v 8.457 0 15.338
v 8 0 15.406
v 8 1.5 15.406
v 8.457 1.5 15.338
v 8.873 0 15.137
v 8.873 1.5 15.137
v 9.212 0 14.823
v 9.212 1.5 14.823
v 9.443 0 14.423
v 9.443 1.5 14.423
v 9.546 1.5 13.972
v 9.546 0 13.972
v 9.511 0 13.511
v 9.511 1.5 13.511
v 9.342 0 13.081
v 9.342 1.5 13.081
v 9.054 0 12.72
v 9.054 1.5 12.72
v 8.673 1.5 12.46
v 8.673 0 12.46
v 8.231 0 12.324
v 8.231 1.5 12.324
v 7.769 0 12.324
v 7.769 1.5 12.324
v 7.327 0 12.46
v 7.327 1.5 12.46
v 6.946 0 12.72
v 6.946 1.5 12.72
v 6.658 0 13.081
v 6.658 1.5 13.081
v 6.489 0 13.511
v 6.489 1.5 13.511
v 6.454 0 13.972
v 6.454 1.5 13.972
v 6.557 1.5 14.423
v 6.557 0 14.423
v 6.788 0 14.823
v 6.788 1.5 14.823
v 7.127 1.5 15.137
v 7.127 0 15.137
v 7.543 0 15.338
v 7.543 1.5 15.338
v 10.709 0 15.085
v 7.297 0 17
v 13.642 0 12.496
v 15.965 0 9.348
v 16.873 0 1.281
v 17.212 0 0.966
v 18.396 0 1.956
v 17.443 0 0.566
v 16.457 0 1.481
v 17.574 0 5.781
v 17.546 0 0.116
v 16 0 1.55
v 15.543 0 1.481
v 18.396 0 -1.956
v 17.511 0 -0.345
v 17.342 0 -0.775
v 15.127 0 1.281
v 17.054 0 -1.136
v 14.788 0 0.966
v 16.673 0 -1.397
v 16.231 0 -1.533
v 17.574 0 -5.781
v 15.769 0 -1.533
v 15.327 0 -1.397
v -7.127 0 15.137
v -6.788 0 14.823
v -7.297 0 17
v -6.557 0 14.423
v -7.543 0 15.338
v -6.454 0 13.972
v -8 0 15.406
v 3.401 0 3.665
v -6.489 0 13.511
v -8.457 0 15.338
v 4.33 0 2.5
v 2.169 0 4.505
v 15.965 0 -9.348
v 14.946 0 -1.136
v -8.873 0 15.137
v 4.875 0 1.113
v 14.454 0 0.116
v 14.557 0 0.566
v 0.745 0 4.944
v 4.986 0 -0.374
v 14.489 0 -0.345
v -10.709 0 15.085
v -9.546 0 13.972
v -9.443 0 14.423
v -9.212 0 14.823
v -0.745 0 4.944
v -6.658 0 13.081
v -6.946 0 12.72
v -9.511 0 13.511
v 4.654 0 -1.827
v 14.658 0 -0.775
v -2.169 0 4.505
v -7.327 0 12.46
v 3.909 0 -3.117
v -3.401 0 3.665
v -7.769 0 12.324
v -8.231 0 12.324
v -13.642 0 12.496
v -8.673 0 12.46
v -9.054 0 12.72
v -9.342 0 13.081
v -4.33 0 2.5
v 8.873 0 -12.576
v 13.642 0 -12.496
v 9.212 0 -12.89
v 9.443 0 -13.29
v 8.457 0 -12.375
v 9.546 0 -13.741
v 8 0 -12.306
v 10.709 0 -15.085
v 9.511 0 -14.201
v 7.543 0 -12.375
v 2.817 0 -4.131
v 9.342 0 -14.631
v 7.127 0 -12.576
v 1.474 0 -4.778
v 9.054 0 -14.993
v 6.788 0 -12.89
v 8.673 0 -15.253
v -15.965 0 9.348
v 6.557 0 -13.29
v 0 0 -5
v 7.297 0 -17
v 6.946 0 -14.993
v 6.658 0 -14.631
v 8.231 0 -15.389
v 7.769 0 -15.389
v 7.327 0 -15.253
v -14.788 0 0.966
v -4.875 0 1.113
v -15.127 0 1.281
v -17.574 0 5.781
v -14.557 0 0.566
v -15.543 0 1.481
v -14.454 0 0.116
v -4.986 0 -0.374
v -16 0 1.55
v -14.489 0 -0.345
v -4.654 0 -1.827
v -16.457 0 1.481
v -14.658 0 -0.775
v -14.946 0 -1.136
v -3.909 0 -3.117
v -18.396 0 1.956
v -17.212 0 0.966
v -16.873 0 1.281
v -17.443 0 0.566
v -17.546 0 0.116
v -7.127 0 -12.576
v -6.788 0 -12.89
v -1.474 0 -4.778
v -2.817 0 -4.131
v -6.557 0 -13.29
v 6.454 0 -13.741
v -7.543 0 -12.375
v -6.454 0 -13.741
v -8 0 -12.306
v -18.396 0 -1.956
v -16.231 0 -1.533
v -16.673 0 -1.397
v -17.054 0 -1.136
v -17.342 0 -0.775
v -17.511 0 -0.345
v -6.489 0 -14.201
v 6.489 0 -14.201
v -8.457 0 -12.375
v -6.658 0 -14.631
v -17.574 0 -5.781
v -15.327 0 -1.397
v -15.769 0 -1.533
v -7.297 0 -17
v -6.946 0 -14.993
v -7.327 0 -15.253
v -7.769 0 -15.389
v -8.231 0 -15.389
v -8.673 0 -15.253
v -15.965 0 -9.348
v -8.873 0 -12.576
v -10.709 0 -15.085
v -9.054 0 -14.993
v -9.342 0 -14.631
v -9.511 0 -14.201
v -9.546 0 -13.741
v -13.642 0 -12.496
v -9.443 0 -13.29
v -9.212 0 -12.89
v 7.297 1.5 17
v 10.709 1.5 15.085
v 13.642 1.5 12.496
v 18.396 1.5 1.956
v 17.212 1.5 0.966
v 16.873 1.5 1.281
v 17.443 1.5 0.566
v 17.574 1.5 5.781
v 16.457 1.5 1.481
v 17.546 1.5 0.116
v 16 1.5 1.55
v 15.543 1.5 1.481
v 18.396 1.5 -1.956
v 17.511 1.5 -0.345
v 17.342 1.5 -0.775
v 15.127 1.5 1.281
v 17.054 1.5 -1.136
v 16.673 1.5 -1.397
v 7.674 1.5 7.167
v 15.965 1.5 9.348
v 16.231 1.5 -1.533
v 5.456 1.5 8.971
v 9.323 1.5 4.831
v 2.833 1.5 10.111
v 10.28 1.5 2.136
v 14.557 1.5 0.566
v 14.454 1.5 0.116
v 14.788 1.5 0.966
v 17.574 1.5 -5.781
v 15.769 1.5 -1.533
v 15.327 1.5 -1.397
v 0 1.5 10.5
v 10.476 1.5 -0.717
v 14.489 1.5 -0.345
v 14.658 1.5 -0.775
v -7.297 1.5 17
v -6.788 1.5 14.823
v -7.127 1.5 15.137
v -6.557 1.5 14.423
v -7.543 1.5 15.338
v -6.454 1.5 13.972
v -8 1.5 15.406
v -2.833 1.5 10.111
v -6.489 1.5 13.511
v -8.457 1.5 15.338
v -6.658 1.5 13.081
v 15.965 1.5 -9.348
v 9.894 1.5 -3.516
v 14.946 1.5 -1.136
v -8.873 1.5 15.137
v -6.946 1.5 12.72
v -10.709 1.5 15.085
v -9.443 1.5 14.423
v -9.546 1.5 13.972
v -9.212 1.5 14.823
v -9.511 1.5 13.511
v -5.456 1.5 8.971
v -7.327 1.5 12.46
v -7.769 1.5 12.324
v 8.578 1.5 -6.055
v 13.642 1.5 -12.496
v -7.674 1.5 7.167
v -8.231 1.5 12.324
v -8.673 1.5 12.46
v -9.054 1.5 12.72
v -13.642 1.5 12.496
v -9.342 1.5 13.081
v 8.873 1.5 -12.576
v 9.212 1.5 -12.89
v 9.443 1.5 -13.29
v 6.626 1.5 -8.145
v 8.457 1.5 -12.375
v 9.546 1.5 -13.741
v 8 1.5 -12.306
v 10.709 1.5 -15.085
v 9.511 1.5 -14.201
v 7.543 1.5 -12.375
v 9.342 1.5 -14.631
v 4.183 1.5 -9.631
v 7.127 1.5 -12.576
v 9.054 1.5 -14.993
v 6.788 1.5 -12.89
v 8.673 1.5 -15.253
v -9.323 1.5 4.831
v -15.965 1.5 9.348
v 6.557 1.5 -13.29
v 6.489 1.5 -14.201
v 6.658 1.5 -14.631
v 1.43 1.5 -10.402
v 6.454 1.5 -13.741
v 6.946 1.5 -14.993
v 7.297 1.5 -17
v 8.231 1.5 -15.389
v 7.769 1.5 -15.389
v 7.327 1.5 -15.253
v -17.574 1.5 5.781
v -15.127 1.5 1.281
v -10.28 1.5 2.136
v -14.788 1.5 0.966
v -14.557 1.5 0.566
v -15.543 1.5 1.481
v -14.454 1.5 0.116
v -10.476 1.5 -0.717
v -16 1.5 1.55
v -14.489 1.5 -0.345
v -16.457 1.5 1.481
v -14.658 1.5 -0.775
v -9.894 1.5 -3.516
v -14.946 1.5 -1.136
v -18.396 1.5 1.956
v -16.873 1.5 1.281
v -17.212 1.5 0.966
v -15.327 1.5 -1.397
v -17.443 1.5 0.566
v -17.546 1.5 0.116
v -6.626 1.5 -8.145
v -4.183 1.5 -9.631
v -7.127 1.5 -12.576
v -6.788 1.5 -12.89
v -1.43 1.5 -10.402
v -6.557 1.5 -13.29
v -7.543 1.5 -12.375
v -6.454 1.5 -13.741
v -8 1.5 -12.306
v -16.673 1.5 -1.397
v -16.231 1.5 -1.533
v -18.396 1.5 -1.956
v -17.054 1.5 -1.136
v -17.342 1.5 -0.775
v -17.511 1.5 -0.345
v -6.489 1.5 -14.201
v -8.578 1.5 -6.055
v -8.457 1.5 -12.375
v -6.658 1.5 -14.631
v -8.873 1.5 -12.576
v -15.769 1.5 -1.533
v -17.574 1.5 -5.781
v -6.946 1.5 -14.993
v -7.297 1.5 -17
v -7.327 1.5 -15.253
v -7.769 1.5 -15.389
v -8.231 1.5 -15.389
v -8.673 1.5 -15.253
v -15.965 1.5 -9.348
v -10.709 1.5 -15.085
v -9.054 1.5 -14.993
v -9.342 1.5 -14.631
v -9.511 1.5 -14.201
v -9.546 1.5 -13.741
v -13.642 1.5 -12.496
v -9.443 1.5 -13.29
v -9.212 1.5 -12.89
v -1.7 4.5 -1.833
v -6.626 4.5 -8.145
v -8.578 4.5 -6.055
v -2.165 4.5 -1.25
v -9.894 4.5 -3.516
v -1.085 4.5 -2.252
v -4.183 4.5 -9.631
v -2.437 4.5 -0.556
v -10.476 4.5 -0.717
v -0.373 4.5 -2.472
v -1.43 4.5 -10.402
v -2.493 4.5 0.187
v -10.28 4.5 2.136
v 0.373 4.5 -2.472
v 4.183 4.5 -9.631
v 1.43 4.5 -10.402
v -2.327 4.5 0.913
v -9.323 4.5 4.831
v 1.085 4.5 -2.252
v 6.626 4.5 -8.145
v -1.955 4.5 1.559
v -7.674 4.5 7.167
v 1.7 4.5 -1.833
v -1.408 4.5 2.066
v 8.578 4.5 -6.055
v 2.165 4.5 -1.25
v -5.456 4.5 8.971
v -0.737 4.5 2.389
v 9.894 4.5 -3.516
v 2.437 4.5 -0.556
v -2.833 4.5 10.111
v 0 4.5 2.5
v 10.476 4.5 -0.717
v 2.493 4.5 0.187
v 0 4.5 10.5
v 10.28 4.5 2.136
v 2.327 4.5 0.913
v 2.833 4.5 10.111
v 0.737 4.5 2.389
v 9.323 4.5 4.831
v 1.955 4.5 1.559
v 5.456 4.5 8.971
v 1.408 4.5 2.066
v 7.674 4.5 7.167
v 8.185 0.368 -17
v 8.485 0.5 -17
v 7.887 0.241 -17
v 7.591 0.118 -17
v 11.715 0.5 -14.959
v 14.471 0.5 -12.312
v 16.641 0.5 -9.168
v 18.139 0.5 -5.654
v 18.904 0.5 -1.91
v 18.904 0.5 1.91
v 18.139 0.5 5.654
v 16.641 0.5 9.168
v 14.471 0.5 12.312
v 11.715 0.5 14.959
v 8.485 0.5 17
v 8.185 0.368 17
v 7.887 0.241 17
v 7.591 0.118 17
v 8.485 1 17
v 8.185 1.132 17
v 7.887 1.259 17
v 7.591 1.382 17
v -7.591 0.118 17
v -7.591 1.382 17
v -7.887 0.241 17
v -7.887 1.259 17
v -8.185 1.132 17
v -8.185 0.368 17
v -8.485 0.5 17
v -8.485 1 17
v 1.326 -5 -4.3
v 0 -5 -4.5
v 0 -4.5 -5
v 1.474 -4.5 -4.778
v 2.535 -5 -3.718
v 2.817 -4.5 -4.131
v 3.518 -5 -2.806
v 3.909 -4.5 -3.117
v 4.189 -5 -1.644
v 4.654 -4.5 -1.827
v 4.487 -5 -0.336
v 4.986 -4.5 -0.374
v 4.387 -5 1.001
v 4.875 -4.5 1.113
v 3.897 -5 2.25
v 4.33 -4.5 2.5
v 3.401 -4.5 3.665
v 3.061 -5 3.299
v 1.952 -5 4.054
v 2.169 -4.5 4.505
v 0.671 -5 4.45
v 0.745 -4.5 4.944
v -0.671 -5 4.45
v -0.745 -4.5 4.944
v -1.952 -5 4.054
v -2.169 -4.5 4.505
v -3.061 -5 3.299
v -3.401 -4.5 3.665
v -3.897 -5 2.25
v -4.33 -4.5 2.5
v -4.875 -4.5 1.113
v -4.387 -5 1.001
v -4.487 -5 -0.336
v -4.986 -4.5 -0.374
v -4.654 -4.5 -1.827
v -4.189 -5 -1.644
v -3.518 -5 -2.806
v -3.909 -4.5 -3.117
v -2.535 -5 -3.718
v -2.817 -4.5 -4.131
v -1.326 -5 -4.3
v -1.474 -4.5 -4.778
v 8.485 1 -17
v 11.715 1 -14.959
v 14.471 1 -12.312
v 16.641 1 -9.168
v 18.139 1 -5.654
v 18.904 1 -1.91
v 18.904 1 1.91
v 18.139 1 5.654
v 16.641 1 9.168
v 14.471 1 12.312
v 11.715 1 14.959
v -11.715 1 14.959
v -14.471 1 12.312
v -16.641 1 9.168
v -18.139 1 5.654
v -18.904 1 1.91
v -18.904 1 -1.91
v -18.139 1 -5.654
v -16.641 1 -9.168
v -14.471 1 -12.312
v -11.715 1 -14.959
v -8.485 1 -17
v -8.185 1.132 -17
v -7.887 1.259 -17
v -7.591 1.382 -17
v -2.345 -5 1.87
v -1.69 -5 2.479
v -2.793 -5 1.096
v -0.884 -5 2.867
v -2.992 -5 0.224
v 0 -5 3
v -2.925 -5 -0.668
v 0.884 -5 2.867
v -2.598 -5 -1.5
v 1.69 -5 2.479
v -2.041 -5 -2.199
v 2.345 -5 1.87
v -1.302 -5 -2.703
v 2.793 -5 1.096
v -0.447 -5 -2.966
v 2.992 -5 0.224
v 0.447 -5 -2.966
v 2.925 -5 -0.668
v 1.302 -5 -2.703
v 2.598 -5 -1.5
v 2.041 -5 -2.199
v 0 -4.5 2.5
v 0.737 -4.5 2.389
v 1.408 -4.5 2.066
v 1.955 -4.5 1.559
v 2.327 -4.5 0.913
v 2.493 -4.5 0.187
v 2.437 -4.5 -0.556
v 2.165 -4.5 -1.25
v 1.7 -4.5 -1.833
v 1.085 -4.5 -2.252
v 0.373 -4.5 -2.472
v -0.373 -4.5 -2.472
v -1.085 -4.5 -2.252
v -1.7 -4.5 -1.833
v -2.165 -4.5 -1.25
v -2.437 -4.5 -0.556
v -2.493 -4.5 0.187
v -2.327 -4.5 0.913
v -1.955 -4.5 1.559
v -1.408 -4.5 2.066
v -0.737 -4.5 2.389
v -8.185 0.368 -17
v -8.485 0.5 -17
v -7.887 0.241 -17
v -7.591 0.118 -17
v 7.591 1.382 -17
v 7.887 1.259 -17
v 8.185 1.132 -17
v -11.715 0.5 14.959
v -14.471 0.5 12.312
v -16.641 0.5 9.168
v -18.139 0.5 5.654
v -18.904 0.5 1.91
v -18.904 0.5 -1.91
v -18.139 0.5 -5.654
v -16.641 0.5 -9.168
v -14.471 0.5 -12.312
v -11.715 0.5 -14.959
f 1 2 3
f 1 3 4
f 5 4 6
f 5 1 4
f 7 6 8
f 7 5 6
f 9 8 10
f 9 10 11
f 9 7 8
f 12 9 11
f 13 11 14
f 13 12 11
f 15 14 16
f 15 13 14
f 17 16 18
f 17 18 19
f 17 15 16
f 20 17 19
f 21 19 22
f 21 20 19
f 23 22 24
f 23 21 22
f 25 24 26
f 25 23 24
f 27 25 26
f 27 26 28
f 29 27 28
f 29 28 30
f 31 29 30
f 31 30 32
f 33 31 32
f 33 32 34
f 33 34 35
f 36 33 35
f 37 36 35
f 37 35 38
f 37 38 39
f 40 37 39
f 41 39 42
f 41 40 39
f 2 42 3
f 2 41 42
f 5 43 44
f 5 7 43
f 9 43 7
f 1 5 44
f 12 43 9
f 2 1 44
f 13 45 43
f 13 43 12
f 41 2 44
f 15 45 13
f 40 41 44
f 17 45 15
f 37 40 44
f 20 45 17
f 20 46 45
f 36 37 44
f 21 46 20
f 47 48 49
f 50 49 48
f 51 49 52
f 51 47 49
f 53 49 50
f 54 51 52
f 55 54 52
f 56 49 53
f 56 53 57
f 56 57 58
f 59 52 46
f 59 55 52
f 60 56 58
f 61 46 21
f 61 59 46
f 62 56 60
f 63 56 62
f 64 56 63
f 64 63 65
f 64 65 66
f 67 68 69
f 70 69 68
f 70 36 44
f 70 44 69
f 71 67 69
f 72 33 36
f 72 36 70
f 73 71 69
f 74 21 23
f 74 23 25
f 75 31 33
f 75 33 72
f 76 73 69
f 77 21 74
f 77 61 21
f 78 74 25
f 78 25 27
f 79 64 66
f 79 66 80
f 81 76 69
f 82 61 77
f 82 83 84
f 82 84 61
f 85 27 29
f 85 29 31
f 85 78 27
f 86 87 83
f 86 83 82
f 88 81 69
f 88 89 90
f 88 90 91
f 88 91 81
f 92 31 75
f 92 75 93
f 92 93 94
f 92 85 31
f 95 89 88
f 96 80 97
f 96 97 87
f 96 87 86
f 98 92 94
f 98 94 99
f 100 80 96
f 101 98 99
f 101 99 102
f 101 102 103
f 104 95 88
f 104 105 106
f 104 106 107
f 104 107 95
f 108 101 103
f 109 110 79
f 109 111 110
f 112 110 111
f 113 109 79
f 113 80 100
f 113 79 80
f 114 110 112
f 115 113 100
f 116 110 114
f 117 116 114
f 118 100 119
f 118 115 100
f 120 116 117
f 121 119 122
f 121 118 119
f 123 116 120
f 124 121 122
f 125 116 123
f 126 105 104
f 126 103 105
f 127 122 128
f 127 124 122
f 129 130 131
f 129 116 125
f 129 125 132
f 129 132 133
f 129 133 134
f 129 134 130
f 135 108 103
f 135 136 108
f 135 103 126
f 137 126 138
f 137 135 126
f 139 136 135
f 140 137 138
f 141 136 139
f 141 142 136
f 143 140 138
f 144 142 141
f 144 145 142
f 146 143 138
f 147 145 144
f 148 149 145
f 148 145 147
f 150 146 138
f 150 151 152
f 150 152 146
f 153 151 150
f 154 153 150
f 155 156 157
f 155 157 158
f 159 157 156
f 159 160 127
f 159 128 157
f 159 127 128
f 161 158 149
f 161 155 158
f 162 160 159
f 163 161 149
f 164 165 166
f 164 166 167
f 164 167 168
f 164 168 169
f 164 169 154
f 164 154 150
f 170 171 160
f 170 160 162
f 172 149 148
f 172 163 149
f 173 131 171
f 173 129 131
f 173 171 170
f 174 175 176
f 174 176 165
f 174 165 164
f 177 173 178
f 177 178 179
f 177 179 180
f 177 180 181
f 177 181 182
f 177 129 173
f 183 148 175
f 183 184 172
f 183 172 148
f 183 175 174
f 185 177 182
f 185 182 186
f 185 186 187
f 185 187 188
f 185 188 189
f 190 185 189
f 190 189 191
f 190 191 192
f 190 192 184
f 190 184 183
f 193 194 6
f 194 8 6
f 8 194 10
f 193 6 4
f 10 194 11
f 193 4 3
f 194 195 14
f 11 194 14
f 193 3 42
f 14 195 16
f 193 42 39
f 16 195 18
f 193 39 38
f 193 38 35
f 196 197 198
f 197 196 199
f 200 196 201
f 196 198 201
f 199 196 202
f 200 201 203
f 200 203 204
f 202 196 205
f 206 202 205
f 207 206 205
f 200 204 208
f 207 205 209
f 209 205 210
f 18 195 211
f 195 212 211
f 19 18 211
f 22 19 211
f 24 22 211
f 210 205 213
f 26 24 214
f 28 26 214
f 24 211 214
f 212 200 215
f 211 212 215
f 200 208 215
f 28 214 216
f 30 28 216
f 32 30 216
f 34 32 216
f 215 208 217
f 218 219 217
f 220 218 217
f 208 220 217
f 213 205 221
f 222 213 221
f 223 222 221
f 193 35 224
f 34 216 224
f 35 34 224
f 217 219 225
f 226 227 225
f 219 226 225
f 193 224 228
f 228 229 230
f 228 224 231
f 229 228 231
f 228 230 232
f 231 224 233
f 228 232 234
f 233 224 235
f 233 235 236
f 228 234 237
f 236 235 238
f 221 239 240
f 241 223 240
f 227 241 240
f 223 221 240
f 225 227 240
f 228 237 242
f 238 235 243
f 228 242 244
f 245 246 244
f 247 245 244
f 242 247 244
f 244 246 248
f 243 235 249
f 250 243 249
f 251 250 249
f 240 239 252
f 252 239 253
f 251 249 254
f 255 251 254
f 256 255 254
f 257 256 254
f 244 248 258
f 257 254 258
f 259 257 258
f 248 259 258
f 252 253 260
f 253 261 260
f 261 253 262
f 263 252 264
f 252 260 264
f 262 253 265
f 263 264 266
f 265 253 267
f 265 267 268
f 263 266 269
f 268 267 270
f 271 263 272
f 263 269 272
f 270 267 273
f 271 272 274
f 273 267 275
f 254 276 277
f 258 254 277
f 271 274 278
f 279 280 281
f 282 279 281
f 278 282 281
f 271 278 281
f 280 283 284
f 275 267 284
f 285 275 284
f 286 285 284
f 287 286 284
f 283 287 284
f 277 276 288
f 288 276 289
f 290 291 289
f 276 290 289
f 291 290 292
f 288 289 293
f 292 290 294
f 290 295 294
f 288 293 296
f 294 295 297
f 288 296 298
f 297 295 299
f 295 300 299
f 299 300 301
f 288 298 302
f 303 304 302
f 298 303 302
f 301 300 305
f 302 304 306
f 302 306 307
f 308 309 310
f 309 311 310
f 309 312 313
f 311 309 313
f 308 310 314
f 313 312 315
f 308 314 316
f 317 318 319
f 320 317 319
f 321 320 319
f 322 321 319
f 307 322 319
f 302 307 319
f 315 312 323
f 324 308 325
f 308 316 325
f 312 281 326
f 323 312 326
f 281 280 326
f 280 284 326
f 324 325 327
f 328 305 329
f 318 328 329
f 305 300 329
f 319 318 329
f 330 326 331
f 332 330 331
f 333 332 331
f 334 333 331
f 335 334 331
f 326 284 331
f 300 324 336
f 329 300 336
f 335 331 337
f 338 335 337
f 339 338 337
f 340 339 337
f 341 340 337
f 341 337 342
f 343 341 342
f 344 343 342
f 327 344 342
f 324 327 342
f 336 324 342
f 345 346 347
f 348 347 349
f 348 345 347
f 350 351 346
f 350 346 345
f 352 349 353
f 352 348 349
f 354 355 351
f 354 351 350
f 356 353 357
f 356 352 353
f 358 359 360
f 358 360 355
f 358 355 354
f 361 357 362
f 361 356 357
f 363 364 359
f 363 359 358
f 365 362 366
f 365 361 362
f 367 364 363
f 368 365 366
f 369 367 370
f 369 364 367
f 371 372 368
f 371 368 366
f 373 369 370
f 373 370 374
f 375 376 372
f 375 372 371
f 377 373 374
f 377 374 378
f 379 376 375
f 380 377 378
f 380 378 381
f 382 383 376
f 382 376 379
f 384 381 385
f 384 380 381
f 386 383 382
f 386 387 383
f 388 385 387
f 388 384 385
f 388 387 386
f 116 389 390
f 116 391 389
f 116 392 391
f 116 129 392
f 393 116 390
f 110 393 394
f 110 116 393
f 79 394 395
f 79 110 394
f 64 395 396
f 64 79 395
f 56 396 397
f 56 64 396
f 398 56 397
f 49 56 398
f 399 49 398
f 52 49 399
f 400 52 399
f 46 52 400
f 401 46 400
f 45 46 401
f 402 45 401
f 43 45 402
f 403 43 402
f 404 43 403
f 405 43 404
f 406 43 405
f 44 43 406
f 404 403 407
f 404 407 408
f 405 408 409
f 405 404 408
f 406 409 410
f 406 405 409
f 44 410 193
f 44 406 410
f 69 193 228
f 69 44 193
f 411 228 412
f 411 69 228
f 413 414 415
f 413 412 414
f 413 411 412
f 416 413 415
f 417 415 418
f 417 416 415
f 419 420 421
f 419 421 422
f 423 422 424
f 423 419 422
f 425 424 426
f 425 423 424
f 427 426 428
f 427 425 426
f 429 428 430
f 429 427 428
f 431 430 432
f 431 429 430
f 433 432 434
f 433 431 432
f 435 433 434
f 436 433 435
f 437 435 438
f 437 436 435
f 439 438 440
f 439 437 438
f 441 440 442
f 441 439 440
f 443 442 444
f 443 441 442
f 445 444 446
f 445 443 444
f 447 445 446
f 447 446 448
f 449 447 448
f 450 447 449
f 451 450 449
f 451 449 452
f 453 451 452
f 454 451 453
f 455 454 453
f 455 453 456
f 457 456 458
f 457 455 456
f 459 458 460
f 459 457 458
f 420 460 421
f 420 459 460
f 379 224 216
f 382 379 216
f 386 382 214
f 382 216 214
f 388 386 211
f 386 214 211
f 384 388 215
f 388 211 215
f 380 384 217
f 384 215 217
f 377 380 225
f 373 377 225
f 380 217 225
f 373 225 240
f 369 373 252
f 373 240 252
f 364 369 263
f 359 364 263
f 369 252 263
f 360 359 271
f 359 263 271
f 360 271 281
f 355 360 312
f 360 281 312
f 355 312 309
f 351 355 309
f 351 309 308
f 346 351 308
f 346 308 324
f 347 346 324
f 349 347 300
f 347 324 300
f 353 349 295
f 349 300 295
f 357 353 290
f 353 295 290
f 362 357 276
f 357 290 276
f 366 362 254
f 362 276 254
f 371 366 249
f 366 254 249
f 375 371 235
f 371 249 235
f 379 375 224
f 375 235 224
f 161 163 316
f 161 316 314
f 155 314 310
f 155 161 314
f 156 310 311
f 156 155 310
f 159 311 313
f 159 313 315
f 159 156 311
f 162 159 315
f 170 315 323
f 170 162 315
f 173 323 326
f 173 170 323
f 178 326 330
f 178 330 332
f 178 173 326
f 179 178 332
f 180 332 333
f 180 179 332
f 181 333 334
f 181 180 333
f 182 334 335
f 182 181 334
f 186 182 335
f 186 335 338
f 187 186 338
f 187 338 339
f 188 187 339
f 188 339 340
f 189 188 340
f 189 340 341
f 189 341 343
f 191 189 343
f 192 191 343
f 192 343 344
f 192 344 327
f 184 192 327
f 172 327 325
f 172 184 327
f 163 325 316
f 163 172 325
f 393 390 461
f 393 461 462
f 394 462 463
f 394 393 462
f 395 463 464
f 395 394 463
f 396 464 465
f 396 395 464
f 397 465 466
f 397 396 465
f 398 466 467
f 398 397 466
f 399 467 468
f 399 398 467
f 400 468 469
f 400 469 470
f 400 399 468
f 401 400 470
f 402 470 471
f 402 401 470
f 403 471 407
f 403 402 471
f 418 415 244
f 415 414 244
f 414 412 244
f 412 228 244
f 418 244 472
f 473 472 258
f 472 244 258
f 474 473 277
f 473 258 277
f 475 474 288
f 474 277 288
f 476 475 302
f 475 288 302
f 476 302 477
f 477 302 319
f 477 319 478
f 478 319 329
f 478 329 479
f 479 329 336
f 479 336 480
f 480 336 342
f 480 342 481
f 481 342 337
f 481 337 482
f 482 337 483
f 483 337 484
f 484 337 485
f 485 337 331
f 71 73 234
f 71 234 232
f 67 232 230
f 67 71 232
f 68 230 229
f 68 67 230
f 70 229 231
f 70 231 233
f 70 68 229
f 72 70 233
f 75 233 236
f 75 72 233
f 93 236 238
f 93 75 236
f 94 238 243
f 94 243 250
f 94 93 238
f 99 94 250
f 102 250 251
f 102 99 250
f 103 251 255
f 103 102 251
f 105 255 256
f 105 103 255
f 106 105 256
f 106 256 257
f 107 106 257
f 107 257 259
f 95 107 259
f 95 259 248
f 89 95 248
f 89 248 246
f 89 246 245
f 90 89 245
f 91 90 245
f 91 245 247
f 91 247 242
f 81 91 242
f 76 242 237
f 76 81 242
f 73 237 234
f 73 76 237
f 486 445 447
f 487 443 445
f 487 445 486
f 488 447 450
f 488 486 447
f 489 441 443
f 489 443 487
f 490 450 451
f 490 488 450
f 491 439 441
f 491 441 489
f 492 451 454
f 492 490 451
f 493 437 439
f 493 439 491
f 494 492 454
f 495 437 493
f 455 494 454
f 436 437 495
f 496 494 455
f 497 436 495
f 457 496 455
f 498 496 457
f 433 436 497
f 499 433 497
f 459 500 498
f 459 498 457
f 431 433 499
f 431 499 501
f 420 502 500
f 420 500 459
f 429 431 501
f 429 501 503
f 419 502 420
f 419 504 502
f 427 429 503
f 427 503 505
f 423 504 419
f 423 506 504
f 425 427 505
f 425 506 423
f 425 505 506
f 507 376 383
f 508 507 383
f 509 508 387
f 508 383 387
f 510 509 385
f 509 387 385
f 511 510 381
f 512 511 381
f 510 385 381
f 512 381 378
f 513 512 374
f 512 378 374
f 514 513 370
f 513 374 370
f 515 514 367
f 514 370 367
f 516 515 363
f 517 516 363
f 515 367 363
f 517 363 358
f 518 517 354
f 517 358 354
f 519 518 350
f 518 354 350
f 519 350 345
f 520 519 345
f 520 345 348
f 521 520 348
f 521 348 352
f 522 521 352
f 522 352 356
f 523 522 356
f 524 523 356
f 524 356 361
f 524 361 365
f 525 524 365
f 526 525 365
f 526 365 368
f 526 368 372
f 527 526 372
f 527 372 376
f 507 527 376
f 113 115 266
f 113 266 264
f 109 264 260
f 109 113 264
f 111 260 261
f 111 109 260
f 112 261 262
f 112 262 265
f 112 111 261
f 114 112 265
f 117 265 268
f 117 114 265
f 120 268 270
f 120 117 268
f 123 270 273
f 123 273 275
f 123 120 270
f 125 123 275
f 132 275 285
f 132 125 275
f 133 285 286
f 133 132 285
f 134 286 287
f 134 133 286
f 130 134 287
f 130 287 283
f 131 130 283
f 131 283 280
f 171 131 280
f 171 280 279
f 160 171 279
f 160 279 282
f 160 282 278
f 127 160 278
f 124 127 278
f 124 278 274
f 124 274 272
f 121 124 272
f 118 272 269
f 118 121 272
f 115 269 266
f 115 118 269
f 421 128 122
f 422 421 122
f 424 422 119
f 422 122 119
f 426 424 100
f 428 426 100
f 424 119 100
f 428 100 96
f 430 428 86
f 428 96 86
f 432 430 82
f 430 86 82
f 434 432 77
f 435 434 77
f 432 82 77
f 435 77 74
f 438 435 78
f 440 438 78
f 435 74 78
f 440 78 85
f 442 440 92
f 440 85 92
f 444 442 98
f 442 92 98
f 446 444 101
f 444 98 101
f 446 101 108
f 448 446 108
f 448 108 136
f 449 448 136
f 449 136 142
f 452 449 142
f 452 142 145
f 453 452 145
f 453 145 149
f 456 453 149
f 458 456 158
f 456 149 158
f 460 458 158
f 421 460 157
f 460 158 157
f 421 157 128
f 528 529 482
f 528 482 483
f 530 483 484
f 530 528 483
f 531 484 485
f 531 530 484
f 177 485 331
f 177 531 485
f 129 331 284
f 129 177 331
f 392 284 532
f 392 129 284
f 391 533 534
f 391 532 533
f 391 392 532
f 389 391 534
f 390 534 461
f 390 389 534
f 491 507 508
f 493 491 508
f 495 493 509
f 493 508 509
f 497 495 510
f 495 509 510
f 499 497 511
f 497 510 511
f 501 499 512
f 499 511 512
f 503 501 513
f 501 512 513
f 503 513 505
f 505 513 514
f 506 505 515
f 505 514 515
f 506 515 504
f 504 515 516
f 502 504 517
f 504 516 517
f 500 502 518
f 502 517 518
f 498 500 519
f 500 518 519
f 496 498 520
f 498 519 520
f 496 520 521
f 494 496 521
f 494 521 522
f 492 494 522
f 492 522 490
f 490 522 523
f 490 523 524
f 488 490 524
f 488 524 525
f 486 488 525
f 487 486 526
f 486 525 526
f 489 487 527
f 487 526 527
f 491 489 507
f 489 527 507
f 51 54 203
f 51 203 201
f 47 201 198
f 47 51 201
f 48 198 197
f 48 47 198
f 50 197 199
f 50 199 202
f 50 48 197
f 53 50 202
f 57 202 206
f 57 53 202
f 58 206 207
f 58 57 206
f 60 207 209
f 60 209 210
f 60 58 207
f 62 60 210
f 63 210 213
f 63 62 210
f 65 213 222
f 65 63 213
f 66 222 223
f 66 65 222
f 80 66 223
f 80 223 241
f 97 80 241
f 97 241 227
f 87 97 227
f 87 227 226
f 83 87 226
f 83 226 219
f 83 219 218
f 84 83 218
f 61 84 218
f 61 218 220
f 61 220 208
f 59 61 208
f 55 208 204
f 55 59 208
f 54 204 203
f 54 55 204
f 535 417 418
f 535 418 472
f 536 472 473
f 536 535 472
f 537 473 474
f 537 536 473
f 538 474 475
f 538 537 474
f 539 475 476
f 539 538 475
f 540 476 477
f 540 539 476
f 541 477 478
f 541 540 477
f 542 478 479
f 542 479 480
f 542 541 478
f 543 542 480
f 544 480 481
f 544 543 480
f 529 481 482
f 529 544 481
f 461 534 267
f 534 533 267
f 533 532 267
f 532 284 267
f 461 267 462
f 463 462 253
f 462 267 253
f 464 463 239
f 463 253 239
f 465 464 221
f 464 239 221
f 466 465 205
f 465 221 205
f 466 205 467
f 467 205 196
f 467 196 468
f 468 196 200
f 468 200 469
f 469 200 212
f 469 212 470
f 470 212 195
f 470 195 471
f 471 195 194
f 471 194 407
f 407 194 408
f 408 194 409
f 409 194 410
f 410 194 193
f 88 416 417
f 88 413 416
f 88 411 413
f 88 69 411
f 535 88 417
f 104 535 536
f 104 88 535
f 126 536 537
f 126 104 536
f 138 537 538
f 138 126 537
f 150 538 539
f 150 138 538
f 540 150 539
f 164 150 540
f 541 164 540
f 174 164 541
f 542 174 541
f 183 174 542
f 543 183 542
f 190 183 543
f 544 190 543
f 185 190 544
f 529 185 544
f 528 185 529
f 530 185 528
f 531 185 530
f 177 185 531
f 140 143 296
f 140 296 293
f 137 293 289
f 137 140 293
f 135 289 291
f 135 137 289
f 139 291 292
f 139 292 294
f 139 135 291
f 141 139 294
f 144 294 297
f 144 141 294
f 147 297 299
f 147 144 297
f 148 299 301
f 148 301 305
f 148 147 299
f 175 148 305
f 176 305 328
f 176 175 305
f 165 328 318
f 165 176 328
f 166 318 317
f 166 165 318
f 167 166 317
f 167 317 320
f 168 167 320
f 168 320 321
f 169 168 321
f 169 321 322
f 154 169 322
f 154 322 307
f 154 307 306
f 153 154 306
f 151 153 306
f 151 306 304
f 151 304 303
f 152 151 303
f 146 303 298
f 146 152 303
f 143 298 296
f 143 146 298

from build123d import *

# Parameters (mm, degrees)
SKETCH1_R           = 1.55
BOSS_EXTRUDE1_DEPTH = 1.5
SKETCH2_R           = 10.5
BOSS_EXTRUDE2_DEPTH = 3
SKETCH3_R           = 5
BOSS_EXTRUDE3_DEPTH = 5
SKETCH4_R           = 2.5
CUT_EXTRUDE1_DEPTH  = 28.207535721
CHAMFER1_SIZE       = 0.5


with BuildPart() as part:
    # Sketch1 → Boss-Extrude1 (new body)
    with BuildSketch(Plane(origin=(0, 0, 0), x_dir=(1, 0, 0), z_dir=(0, 1, 0))):
        with BuildLine():
            Line((-8.485281374, 17), (8.485281374, 17))
            ThreePointArc((8.485281374, 17), (19, 0), (8.485281374, -17))
            Line((8.485281374, -17), (-8.485281374, -17))
            ThreePointArc((-8.485281374, -17), (-19, 0), (-8.485281374, 17))
        make_face()
        with Locations(Location((-16, 0, 0), (0, 0, 270))):
            Circle(SKETCH1_R, mode=Mode.SUBTRACT)
        with Locations(Location((-8, 13.856406461, 0), (0, 0, 270))):
            Circle(SKETCH1_R, mode=Mode.SUBTRACT)
        with Locations(Location((8, 13.856406461, 0), (0, 0, 270))):
            Circle(SKETCH1_R, mode=Mode.SUBTRACT)
        with Locations(Location((16, 0, 0), (0, 0, 270))):
            Circle(SKETCH1_R, mode=Mode.SUBTRACT)
        with Locations(Location((8, -13.856406461, 0), (0, 0, 270))):
            Circle(SKETCH1_R, mode=Mode.SUBTRACT)
        with Locations(Location((-8, -13.856406461, 0), (0, 0, 270))):
            Circle(SKETCH1_R, mode=Mode.SUBTRACT)
    extrude(amount=BOSS_EXTRUDE1_DEPTH)

    # Sketch2 → Boss-Extrude2 (add)
    with BuildSketch(Plane(origin=(0, 1.5, 0), x_dir=(1, 0, 0), z_dir=(0, 1, 0))):
        with Locations(Location((0, 0, 0), (0, 0, 270))):
            Circle(SKETCH2_R)
    extrude(amount=BOSS_EXTRUDE2_DEPTH)

    # Sketch3 → Boss-Extrude3 (add)
    with BuildSketch(Plane.XZ):
        with Locations(Location((0, 0, 0), (0, 0, 270))):
            Circle(SKETCH3_R)
    extrude(amount=BOSS_EXTRUDE3_DEPTH)

    # Sketch4 → Cut-Extrude1 (cut, through all)
    with BuildSketch(Plane(origin=(0, 4.5, 0), x_dir=(1, 0, 0), z_dir=(0, 1, 0))):
        with Locations(Location((0, 0, 0), (0, 0, 270))):
            Circle(SKETCH4_R)
    extrude(amount=-CUT_EXTRUDE1_DEPTH, mode=Mode.SUBTRACT)

    # Chamfer1
    chamfer1_edges = [part.edges().sort_by_distance(p)[0] for p in [
        (-19, 1.5, 0),
        (0, -5, 5),
        (19, 1.5, 0),
        (0, -5, -2.5),
        (-19, 0, 0),
        (19, 0, 0),
    ]]
    chamfer(chamfer1_edges, length=CHAMFER1_SIZE)


solid = part.part
